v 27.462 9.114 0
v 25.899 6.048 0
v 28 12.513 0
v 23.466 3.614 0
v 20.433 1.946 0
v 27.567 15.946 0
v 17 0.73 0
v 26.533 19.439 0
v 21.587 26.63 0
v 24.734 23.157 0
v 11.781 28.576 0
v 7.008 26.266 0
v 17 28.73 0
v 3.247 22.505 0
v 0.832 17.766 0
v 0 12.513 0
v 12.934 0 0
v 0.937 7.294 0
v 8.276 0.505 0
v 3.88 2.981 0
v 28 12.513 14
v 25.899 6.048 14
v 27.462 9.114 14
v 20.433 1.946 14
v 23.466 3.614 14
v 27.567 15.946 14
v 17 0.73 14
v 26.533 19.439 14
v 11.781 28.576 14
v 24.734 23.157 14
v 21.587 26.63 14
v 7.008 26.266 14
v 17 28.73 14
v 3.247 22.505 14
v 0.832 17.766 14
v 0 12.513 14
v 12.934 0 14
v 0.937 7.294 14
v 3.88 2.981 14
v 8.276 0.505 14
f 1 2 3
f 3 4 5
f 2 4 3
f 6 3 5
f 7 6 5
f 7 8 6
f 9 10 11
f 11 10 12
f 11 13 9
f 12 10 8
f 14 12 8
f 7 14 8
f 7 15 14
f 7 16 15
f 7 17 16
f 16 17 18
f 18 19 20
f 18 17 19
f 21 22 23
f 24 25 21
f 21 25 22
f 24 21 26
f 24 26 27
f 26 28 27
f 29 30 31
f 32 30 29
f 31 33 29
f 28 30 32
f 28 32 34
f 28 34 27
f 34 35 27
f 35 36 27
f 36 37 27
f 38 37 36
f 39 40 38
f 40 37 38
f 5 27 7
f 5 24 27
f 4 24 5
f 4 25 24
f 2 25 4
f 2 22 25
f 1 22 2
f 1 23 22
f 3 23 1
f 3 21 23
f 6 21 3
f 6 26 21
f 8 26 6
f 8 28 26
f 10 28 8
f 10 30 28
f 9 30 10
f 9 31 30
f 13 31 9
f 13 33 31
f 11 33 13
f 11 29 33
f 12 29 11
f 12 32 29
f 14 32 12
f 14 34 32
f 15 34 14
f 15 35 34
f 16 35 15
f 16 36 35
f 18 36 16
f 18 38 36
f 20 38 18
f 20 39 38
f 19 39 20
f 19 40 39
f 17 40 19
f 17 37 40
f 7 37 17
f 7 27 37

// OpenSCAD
$fn = 32;

// ----------------------------------------------------------------------
// Cam disc: base radius 11.0 mm, lift 6.0 mm, 20 profile points
// ----------------------------------------------------------------------

// --- parameters (mm) ---
profile_height = 14;      // extrusion height
profile_points = 20;      // points of the closed outline

profile = [[28, 12.513], [27.567, 15.946], [26.533, 19.439], [24.734, 23.157], [21.587, 26.63], [17, 28.73], [11.781, 28.576], [7.008, 26.266], [3.247, 22.505], [0.832, 17.766], [0, 12.513], [0.937, 7.294], [3.88, 2.981], [8.276, 0.505], [12.934, 0], [17, 0.73], [20.433, 1.946], [23.466, 3.614], [25.899, 6.048], [27.462, 9.114]];  // single closed polygon, 20 points, counter clockwise

// --- the one profile operation ---
linear_extrude(height = profile_height) polygon(points = profile);
